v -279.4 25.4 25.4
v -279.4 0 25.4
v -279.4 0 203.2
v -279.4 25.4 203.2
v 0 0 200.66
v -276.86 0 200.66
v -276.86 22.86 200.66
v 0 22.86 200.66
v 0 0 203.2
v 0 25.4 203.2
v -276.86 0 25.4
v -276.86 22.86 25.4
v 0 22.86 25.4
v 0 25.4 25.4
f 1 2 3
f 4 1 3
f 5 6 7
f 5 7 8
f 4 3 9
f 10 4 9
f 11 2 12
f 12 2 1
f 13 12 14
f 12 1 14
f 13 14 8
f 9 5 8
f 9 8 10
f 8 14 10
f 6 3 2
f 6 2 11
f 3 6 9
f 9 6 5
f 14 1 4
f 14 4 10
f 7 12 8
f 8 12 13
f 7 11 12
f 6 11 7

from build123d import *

# Parameters (mm, degrees)
BOSS_EXTRUDE1_DEPTH = 25.4
FILLET1_R           = 20.32
SHELL1_T            = -2.54
SKETCH2_R           = 2.54
CUT_EXTRUDE1_DEPTH  = 347.409815103
SKETCH3_R           = 2.54
CUT_EXTRUDE2_DEPTH  = 347.409815103


with BuildPart() as part:
    # Sketch1 → Boss-Extrude1 (new body)
    with BuildSketch(Plane(origin=(0, 0, 0), x_dir=(1, 0, 0), z_dir=(0, 1, 0))):
        Polygon((-279.4, 203.2), (-279.4, -203.2), (279.4, -203.2), (279.4, 203.2), (152.4, 203.2), (152.4, 12.7), (-152.4, 12.7), (-152.4, 203.2), align=None)
    extrude(amount=BOSS_EXTRUDE1_DEPTH)

    # Fillet1
    fillet1_edges = [part.edges().sort_by_distance(p)[0] for p in [
        (279.4, 12.7, -203.2),
        (-279.4, 12.7, -203.2),
        (-152.4, 12.7, -203.2),
        (152.4, 12.7, -203.2),
    ]]
    fillet(fillet1_edges, radius=FILLET1_R)

    # Shell1
    shell1_openings = [part.faces().sort_by_distance(p)[0] for p in [
        (0, 0, 37.577423361),
    ]]
    offset(amount=SHELL1_T, openings=shell1_openings, kind=Kind.INTERSECTION)

    # Sketch2 → Cut-Extrude1 (cut, through all)
    with BuildSketch(Plane(origin=(0, 25.4, 0), x_dir=(1, 0, 0), z_dir=(0, 1, 0))):
        with Locations(Location((-177.72, 165.1, 0), (0, 0, 270))):
            Circle(SKETCH2_R)
        with Locations(Location((-167.56, 165.1, 0), (0, 0, 270))):
            Circle(SKETCH2_R)
        with Locations(Location((167.56, 165.1, 0), (0, 0, 270))):
            Circle(SKETCH2_R)
        with Locations(Location((177.72, 165.1, 0), (0, 0, 270))):
            Circle(SKETCH2_R)
    extrude(amount=-CUT_EXTRUDE1_DEPTH, mode=Mode.SUBTRACT)

    # Sketch3 → Cut-Extrude2 (cut, through all)
    with BuildSketch(Plane(origin=(0, 25.4, 0), x_dir=(1, 0, 0), z_dir=(0, 1, 0))):
        with BuildLine():
            Line((-279.4, 182.88), (-279.4, -25.4))
            Line((-279.4, -25.4), (0, -25.4))
            Line((0, -25.4), (0, -203.2))
            Line((0, -203.2), (279.4, -203.2))
            Line((279.4, -203.2), (279.4, 182.88))
            ThreePointArc((279.4, 182.88), (273.448409794, 197.248409794), (259.08, 203.2))
            Line((259.08, 203.2), (172.72, 203.2))
            ThreePointArc((172.72, 203.2), (158.351590206, 197.248409794), (152.4, 182.88))
            Line((152.4, 182.88), (152.4, 12.7))
            Line((152.4, 12.7), (-152.4, 12.7))
            Line((-152.4, 12.7), (-152.4, 182.88))
            ThreePointArc((-152.4, 182.88), (-158.351590206, 197.248409794), (-172.72, 203.2))
            Line((-172.72, 203.2), (-259.08, 203.2))
            ThreePointArc((-259.08, 203.2), (-273.448409794, 197.248409794), (-279.4, 182.88))
        make_face()
        with Locations((-177.72, 165.1)):
            Circle(SKETCH3_R, mode=Mode.SUBTRACT)
        with Locations((-167.56, 165.1)):
            Circle(SKETCH3_R, mode=Mode.SUBTRACT)
        with Locations((167.56, 165.1)):
            Circle(SKETCH3_R, mode=Mode.SUBTRACT)
        with Locations((177.72, 165.1)):
            Circle(SKETCH3_R, mode=Mode.SUBTRACT)
    extrude(amount=-CUT_EXTRUDE2_DEPTH, mode=Mode.SUBTRACT)


solid = part.part
